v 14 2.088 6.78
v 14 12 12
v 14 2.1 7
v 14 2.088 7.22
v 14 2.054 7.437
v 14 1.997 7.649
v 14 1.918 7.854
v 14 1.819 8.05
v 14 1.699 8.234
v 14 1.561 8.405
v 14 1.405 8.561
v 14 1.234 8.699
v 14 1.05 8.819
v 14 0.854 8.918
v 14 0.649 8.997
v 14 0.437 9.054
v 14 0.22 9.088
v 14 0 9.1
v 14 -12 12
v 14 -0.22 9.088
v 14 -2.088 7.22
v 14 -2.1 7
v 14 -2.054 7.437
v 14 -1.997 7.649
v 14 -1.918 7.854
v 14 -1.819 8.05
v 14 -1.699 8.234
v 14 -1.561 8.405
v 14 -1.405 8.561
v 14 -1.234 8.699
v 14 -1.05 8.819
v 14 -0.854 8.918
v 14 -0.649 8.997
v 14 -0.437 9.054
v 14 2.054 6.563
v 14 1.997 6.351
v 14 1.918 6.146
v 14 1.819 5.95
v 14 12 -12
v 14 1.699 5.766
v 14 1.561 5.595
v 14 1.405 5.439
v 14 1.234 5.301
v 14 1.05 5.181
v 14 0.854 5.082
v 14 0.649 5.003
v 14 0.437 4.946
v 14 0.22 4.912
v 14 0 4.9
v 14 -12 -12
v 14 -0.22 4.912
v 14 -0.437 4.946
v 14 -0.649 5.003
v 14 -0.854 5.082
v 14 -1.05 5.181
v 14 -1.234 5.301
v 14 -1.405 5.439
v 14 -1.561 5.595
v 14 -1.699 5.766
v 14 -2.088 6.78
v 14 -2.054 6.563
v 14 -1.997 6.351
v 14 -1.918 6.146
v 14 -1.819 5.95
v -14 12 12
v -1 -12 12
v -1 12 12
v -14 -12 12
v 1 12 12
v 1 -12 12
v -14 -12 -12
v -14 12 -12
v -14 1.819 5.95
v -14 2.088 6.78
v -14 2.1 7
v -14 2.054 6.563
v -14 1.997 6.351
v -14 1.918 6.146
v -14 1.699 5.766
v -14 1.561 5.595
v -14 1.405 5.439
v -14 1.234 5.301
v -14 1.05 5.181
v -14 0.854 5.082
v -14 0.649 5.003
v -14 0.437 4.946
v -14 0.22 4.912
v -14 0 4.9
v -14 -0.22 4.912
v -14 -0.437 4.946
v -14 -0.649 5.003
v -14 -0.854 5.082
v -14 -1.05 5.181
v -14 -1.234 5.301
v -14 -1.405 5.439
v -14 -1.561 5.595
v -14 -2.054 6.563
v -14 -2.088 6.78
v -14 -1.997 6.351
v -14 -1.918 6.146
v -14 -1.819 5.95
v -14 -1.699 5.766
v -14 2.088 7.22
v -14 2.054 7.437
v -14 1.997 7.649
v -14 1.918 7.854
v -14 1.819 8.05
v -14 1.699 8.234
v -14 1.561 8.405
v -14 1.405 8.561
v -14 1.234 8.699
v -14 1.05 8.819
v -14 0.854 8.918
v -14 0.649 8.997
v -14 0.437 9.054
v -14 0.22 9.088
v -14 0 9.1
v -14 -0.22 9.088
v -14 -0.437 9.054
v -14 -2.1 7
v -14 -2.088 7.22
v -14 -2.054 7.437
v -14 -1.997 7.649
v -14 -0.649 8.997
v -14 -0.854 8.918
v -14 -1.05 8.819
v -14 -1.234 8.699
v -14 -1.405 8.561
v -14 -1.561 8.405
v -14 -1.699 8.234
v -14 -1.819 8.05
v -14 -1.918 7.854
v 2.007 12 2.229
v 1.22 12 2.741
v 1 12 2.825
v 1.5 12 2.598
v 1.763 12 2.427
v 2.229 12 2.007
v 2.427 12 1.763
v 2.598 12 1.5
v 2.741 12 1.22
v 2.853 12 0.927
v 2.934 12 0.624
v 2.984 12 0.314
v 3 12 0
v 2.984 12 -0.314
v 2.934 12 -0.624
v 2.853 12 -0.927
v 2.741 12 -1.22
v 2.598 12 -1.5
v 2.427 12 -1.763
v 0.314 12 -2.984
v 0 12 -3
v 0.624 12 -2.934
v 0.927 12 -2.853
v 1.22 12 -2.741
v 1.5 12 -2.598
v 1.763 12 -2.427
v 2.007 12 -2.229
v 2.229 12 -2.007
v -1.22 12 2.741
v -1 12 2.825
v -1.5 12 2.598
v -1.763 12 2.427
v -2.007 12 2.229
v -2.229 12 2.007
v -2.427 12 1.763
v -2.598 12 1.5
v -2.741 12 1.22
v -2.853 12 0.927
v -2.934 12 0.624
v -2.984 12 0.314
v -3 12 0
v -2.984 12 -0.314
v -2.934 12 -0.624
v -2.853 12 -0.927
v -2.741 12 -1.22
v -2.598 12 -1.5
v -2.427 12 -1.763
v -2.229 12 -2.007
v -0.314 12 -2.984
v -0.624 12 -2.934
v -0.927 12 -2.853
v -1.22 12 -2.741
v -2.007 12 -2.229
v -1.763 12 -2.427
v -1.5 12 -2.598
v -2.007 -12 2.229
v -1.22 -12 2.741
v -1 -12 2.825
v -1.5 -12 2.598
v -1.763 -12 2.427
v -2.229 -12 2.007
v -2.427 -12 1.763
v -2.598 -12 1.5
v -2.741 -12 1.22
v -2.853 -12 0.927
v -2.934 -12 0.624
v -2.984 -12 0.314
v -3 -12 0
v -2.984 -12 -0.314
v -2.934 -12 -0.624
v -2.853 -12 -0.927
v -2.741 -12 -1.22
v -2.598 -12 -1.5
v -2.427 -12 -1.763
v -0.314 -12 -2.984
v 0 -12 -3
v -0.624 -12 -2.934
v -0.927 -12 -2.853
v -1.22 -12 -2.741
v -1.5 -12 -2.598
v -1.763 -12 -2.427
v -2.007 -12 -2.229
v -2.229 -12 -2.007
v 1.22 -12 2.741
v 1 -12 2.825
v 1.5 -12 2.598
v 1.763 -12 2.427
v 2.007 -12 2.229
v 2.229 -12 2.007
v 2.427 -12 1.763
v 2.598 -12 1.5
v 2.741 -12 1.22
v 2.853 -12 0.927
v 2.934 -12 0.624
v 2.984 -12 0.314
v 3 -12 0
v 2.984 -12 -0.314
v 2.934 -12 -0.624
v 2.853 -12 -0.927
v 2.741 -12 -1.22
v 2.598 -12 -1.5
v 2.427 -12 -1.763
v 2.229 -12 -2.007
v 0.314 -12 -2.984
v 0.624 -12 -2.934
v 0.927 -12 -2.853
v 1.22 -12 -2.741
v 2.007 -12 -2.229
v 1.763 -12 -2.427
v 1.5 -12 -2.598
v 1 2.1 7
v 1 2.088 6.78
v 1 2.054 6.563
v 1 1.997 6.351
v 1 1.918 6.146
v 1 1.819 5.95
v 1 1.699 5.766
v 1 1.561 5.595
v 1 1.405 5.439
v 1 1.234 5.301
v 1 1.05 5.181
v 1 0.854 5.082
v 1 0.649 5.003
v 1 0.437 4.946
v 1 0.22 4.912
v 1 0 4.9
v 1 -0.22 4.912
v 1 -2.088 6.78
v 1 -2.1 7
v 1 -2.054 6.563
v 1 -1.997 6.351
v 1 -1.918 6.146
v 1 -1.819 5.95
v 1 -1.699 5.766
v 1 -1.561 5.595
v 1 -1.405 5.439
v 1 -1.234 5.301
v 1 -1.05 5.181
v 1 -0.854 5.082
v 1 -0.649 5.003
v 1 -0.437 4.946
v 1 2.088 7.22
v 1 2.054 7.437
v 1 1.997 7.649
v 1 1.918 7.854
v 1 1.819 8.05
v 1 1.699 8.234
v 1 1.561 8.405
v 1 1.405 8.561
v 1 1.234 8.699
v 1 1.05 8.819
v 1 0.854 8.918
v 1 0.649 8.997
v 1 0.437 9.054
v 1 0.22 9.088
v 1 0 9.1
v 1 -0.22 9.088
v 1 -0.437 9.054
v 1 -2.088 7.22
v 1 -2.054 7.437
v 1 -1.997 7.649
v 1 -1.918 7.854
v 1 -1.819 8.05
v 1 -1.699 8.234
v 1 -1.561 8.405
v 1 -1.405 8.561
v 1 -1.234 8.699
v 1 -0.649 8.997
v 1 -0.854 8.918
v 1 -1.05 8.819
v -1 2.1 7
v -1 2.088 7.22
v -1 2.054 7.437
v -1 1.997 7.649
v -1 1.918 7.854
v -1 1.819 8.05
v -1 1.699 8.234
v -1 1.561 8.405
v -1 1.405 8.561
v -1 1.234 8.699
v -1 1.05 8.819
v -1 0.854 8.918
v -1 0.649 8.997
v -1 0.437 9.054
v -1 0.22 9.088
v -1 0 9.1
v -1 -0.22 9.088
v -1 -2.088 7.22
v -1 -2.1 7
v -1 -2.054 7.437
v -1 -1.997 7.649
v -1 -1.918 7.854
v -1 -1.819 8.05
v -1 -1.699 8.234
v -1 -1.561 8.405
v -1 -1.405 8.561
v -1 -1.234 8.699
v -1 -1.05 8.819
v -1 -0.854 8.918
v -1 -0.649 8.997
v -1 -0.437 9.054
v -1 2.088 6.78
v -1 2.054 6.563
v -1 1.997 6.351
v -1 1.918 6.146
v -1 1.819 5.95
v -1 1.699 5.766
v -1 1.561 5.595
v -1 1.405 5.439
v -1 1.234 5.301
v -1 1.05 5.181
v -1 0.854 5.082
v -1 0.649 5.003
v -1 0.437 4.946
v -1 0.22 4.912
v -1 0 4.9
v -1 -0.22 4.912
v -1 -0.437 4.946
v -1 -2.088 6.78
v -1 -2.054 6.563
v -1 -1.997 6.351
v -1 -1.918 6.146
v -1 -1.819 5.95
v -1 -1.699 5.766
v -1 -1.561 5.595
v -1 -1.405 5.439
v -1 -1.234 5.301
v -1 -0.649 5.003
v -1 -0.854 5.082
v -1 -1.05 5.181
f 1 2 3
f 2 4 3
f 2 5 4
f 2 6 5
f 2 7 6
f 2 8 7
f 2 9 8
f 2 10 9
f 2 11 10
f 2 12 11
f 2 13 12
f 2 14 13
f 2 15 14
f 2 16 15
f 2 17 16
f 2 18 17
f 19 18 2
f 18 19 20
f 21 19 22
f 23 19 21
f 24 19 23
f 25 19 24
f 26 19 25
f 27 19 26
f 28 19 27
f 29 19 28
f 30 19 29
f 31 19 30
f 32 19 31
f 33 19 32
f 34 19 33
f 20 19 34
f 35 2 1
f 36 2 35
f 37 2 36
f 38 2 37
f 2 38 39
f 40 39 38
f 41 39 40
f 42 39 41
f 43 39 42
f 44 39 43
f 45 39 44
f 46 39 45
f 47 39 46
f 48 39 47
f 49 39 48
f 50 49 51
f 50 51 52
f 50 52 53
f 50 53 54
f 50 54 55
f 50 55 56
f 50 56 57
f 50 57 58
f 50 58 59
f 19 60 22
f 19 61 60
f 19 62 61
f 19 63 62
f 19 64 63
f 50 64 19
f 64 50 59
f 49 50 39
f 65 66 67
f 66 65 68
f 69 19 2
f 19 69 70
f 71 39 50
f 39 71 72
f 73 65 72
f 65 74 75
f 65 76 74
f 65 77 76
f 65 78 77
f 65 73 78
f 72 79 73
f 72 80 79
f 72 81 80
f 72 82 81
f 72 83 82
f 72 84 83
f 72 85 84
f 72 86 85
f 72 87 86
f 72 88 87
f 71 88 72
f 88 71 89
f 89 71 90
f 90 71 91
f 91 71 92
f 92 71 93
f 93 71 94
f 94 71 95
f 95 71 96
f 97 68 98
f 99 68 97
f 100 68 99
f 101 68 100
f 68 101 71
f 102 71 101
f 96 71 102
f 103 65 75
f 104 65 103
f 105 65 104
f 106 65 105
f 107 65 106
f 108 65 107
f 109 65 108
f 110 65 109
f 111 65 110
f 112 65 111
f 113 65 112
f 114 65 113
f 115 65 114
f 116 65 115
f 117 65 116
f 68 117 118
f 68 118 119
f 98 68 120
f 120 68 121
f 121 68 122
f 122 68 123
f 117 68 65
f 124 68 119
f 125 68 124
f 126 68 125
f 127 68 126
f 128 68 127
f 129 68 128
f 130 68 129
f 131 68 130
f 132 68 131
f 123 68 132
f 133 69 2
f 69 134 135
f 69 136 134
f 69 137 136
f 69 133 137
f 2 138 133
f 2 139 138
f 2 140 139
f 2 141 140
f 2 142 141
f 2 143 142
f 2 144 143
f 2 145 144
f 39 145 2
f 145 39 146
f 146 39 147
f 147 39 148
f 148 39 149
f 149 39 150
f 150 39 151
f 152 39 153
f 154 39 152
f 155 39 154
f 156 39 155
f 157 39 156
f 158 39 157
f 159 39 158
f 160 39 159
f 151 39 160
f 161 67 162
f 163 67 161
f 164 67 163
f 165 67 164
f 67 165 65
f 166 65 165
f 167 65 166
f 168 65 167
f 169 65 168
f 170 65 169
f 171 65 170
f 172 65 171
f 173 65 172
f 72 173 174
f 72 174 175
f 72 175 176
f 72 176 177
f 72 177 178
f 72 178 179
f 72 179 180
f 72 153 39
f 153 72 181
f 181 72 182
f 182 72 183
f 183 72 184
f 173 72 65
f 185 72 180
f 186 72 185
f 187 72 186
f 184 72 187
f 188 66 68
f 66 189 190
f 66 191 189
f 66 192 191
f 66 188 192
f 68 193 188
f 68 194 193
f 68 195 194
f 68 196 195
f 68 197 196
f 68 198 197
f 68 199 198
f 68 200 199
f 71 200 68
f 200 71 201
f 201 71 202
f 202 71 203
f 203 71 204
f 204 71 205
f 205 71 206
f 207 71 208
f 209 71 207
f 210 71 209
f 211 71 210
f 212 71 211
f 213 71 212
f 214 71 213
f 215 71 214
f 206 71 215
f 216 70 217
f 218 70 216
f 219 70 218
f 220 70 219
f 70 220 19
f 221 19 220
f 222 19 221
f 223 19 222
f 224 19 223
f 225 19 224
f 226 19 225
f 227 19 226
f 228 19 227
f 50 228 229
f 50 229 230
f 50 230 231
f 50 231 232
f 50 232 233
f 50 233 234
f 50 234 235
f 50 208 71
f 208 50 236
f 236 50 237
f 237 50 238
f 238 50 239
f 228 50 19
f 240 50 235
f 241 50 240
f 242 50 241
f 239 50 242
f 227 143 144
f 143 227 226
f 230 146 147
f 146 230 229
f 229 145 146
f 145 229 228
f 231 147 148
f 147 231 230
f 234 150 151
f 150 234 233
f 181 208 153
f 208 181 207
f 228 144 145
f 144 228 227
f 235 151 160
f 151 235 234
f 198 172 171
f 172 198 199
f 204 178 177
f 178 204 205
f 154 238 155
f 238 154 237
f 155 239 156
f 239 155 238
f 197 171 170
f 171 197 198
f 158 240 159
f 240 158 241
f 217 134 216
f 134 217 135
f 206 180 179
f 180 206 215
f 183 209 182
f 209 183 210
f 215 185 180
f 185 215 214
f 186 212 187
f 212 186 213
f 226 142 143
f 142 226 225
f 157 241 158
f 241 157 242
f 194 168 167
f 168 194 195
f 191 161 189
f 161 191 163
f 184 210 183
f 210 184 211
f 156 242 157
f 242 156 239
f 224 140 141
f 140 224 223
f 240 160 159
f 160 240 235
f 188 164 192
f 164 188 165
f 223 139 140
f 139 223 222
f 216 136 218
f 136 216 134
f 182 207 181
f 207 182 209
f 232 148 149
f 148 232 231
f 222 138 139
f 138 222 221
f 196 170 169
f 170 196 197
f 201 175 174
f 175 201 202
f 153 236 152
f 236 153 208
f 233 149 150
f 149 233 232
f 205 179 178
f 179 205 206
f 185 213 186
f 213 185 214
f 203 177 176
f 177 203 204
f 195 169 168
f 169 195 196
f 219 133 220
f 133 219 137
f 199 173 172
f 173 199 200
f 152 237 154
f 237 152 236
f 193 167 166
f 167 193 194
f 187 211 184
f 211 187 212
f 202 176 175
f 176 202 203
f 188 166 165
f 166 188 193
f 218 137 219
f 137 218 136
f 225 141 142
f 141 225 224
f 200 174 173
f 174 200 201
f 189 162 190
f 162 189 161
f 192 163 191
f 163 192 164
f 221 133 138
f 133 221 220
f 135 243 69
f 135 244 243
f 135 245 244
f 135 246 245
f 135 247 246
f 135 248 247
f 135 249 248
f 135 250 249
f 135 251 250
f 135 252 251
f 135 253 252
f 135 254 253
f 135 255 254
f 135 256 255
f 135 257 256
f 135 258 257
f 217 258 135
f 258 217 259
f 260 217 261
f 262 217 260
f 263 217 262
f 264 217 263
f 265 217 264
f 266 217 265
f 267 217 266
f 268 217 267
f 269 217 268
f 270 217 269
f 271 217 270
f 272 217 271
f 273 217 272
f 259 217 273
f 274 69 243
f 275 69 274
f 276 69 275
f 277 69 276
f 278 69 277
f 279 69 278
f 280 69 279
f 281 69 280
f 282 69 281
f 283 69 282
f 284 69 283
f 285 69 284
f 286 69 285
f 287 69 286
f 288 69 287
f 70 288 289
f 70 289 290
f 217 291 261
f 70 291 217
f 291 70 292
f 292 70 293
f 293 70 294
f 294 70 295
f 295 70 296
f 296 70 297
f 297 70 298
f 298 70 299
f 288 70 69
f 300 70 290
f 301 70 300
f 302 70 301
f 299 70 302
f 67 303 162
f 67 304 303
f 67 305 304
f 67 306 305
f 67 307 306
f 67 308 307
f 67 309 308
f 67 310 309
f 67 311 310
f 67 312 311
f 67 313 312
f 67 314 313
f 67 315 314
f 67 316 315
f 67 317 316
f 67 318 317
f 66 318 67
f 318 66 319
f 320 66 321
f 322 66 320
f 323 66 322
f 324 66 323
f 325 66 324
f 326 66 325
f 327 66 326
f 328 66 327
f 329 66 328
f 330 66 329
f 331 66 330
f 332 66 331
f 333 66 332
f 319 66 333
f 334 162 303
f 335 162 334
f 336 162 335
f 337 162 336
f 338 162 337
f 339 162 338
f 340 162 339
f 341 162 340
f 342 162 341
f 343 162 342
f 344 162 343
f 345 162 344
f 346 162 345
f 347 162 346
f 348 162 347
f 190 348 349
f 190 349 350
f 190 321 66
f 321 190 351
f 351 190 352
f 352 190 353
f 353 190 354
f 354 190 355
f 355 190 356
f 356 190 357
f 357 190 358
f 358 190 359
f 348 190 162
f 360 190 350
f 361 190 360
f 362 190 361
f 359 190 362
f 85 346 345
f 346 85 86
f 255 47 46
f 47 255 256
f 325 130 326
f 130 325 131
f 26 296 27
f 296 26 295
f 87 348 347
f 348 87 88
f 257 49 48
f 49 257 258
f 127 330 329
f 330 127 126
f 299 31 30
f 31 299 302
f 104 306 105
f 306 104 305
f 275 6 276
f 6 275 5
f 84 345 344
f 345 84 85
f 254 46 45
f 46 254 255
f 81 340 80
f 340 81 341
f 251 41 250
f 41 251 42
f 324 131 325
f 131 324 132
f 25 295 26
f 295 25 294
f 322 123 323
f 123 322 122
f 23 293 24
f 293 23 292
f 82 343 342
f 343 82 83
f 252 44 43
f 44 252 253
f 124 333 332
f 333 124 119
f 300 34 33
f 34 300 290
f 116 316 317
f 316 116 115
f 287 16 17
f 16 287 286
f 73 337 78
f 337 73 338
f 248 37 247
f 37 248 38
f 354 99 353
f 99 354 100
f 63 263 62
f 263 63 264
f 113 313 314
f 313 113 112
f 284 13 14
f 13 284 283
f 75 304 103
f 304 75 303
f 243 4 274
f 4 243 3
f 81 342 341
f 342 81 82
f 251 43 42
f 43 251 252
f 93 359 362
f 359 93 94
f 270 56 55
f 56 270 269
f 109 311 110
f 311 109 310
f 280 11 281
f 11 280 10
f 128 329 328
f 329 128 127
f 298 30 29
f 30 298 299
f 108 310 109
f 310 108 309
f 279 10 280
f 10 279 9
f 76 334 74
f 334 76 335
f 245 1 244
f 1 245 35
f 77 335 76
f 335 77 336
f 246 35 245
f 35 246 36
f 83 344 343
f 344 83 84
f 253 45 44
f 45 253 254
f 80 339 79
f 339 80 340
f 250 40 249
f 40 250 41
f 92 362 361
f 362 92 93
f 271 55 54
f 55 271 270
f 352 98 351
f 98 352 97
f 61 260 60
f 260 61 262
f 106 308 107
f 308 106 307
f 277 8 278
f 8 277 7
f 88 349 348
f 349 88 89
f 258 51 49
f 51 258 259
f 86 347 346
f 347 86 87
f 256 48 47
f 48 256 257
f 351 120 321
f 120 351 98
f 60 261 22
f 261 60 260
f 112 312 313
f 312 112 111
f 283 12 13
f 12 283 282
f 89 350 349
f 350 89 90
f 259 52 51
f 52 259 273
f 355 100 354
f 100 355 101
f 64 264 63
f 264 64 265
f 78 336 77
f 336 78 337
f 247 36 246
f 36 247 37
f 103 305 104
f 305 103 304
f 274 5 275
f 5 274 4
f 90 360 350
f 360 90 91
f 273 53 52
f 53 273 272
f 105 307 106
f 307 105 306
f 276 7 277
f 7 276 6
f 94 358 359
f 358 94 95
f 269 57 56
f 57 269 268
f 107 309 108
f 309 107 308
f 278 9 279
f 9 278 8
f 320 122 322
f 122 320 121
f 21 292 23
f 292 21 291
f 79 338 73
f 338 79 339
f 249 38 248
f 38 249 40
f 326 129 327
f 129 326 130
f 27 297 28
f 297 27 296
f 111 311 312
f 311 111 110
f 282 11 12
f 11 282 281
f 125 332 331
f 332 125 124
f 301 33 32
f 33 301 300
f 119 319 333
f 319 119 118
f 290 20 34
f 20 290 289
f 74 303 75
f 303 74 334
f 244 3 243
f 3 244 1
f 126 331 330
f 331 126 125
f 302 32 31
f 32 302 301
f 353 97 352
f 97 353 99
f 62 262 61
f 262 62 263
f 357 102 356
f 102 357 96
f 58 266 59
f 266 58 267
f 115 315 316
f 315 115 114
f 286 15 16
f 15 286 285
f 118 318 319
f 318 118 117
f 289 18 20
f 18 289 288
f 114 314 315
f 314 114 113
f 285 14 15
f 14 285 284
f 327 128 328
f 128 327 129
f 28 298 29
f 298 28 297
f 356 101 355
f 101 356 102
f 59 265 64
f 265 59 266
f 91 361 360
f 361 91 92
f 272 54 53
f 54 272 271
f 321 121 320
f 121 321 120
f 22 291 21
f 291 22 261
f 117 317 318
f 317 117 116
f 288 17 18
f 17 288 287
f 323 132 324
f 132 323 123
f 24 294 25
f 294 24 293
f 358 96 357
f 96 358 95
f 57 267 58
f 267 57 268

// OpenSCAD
// Split clamp block.
$fn = 60;
eps = 0.02;
bore_d = 6;
body_w = 24;
body_h = 24;
body_l = 28;
slot_w = 2;
difference() {
    cube([body_l, body_w, body_h], center = true);
    translate([0, -body_w / 2 - eps, 0]) rotate([-90,0,0]) cylinder(d = bore_d, h = body_w + 2 * eps);
    translate([-slot_w / 2, -body_w / 2 - eps, 0]) cube([slot_w, body_w + 2 * eps, body_h / 2 + eps]);
    translate([-body_l / 2 - eps, 0, body_h / 2 - 5]) rotate([0,90,0]) cylinder(d = 4.2, h = body_l + 2 * eps);
}
